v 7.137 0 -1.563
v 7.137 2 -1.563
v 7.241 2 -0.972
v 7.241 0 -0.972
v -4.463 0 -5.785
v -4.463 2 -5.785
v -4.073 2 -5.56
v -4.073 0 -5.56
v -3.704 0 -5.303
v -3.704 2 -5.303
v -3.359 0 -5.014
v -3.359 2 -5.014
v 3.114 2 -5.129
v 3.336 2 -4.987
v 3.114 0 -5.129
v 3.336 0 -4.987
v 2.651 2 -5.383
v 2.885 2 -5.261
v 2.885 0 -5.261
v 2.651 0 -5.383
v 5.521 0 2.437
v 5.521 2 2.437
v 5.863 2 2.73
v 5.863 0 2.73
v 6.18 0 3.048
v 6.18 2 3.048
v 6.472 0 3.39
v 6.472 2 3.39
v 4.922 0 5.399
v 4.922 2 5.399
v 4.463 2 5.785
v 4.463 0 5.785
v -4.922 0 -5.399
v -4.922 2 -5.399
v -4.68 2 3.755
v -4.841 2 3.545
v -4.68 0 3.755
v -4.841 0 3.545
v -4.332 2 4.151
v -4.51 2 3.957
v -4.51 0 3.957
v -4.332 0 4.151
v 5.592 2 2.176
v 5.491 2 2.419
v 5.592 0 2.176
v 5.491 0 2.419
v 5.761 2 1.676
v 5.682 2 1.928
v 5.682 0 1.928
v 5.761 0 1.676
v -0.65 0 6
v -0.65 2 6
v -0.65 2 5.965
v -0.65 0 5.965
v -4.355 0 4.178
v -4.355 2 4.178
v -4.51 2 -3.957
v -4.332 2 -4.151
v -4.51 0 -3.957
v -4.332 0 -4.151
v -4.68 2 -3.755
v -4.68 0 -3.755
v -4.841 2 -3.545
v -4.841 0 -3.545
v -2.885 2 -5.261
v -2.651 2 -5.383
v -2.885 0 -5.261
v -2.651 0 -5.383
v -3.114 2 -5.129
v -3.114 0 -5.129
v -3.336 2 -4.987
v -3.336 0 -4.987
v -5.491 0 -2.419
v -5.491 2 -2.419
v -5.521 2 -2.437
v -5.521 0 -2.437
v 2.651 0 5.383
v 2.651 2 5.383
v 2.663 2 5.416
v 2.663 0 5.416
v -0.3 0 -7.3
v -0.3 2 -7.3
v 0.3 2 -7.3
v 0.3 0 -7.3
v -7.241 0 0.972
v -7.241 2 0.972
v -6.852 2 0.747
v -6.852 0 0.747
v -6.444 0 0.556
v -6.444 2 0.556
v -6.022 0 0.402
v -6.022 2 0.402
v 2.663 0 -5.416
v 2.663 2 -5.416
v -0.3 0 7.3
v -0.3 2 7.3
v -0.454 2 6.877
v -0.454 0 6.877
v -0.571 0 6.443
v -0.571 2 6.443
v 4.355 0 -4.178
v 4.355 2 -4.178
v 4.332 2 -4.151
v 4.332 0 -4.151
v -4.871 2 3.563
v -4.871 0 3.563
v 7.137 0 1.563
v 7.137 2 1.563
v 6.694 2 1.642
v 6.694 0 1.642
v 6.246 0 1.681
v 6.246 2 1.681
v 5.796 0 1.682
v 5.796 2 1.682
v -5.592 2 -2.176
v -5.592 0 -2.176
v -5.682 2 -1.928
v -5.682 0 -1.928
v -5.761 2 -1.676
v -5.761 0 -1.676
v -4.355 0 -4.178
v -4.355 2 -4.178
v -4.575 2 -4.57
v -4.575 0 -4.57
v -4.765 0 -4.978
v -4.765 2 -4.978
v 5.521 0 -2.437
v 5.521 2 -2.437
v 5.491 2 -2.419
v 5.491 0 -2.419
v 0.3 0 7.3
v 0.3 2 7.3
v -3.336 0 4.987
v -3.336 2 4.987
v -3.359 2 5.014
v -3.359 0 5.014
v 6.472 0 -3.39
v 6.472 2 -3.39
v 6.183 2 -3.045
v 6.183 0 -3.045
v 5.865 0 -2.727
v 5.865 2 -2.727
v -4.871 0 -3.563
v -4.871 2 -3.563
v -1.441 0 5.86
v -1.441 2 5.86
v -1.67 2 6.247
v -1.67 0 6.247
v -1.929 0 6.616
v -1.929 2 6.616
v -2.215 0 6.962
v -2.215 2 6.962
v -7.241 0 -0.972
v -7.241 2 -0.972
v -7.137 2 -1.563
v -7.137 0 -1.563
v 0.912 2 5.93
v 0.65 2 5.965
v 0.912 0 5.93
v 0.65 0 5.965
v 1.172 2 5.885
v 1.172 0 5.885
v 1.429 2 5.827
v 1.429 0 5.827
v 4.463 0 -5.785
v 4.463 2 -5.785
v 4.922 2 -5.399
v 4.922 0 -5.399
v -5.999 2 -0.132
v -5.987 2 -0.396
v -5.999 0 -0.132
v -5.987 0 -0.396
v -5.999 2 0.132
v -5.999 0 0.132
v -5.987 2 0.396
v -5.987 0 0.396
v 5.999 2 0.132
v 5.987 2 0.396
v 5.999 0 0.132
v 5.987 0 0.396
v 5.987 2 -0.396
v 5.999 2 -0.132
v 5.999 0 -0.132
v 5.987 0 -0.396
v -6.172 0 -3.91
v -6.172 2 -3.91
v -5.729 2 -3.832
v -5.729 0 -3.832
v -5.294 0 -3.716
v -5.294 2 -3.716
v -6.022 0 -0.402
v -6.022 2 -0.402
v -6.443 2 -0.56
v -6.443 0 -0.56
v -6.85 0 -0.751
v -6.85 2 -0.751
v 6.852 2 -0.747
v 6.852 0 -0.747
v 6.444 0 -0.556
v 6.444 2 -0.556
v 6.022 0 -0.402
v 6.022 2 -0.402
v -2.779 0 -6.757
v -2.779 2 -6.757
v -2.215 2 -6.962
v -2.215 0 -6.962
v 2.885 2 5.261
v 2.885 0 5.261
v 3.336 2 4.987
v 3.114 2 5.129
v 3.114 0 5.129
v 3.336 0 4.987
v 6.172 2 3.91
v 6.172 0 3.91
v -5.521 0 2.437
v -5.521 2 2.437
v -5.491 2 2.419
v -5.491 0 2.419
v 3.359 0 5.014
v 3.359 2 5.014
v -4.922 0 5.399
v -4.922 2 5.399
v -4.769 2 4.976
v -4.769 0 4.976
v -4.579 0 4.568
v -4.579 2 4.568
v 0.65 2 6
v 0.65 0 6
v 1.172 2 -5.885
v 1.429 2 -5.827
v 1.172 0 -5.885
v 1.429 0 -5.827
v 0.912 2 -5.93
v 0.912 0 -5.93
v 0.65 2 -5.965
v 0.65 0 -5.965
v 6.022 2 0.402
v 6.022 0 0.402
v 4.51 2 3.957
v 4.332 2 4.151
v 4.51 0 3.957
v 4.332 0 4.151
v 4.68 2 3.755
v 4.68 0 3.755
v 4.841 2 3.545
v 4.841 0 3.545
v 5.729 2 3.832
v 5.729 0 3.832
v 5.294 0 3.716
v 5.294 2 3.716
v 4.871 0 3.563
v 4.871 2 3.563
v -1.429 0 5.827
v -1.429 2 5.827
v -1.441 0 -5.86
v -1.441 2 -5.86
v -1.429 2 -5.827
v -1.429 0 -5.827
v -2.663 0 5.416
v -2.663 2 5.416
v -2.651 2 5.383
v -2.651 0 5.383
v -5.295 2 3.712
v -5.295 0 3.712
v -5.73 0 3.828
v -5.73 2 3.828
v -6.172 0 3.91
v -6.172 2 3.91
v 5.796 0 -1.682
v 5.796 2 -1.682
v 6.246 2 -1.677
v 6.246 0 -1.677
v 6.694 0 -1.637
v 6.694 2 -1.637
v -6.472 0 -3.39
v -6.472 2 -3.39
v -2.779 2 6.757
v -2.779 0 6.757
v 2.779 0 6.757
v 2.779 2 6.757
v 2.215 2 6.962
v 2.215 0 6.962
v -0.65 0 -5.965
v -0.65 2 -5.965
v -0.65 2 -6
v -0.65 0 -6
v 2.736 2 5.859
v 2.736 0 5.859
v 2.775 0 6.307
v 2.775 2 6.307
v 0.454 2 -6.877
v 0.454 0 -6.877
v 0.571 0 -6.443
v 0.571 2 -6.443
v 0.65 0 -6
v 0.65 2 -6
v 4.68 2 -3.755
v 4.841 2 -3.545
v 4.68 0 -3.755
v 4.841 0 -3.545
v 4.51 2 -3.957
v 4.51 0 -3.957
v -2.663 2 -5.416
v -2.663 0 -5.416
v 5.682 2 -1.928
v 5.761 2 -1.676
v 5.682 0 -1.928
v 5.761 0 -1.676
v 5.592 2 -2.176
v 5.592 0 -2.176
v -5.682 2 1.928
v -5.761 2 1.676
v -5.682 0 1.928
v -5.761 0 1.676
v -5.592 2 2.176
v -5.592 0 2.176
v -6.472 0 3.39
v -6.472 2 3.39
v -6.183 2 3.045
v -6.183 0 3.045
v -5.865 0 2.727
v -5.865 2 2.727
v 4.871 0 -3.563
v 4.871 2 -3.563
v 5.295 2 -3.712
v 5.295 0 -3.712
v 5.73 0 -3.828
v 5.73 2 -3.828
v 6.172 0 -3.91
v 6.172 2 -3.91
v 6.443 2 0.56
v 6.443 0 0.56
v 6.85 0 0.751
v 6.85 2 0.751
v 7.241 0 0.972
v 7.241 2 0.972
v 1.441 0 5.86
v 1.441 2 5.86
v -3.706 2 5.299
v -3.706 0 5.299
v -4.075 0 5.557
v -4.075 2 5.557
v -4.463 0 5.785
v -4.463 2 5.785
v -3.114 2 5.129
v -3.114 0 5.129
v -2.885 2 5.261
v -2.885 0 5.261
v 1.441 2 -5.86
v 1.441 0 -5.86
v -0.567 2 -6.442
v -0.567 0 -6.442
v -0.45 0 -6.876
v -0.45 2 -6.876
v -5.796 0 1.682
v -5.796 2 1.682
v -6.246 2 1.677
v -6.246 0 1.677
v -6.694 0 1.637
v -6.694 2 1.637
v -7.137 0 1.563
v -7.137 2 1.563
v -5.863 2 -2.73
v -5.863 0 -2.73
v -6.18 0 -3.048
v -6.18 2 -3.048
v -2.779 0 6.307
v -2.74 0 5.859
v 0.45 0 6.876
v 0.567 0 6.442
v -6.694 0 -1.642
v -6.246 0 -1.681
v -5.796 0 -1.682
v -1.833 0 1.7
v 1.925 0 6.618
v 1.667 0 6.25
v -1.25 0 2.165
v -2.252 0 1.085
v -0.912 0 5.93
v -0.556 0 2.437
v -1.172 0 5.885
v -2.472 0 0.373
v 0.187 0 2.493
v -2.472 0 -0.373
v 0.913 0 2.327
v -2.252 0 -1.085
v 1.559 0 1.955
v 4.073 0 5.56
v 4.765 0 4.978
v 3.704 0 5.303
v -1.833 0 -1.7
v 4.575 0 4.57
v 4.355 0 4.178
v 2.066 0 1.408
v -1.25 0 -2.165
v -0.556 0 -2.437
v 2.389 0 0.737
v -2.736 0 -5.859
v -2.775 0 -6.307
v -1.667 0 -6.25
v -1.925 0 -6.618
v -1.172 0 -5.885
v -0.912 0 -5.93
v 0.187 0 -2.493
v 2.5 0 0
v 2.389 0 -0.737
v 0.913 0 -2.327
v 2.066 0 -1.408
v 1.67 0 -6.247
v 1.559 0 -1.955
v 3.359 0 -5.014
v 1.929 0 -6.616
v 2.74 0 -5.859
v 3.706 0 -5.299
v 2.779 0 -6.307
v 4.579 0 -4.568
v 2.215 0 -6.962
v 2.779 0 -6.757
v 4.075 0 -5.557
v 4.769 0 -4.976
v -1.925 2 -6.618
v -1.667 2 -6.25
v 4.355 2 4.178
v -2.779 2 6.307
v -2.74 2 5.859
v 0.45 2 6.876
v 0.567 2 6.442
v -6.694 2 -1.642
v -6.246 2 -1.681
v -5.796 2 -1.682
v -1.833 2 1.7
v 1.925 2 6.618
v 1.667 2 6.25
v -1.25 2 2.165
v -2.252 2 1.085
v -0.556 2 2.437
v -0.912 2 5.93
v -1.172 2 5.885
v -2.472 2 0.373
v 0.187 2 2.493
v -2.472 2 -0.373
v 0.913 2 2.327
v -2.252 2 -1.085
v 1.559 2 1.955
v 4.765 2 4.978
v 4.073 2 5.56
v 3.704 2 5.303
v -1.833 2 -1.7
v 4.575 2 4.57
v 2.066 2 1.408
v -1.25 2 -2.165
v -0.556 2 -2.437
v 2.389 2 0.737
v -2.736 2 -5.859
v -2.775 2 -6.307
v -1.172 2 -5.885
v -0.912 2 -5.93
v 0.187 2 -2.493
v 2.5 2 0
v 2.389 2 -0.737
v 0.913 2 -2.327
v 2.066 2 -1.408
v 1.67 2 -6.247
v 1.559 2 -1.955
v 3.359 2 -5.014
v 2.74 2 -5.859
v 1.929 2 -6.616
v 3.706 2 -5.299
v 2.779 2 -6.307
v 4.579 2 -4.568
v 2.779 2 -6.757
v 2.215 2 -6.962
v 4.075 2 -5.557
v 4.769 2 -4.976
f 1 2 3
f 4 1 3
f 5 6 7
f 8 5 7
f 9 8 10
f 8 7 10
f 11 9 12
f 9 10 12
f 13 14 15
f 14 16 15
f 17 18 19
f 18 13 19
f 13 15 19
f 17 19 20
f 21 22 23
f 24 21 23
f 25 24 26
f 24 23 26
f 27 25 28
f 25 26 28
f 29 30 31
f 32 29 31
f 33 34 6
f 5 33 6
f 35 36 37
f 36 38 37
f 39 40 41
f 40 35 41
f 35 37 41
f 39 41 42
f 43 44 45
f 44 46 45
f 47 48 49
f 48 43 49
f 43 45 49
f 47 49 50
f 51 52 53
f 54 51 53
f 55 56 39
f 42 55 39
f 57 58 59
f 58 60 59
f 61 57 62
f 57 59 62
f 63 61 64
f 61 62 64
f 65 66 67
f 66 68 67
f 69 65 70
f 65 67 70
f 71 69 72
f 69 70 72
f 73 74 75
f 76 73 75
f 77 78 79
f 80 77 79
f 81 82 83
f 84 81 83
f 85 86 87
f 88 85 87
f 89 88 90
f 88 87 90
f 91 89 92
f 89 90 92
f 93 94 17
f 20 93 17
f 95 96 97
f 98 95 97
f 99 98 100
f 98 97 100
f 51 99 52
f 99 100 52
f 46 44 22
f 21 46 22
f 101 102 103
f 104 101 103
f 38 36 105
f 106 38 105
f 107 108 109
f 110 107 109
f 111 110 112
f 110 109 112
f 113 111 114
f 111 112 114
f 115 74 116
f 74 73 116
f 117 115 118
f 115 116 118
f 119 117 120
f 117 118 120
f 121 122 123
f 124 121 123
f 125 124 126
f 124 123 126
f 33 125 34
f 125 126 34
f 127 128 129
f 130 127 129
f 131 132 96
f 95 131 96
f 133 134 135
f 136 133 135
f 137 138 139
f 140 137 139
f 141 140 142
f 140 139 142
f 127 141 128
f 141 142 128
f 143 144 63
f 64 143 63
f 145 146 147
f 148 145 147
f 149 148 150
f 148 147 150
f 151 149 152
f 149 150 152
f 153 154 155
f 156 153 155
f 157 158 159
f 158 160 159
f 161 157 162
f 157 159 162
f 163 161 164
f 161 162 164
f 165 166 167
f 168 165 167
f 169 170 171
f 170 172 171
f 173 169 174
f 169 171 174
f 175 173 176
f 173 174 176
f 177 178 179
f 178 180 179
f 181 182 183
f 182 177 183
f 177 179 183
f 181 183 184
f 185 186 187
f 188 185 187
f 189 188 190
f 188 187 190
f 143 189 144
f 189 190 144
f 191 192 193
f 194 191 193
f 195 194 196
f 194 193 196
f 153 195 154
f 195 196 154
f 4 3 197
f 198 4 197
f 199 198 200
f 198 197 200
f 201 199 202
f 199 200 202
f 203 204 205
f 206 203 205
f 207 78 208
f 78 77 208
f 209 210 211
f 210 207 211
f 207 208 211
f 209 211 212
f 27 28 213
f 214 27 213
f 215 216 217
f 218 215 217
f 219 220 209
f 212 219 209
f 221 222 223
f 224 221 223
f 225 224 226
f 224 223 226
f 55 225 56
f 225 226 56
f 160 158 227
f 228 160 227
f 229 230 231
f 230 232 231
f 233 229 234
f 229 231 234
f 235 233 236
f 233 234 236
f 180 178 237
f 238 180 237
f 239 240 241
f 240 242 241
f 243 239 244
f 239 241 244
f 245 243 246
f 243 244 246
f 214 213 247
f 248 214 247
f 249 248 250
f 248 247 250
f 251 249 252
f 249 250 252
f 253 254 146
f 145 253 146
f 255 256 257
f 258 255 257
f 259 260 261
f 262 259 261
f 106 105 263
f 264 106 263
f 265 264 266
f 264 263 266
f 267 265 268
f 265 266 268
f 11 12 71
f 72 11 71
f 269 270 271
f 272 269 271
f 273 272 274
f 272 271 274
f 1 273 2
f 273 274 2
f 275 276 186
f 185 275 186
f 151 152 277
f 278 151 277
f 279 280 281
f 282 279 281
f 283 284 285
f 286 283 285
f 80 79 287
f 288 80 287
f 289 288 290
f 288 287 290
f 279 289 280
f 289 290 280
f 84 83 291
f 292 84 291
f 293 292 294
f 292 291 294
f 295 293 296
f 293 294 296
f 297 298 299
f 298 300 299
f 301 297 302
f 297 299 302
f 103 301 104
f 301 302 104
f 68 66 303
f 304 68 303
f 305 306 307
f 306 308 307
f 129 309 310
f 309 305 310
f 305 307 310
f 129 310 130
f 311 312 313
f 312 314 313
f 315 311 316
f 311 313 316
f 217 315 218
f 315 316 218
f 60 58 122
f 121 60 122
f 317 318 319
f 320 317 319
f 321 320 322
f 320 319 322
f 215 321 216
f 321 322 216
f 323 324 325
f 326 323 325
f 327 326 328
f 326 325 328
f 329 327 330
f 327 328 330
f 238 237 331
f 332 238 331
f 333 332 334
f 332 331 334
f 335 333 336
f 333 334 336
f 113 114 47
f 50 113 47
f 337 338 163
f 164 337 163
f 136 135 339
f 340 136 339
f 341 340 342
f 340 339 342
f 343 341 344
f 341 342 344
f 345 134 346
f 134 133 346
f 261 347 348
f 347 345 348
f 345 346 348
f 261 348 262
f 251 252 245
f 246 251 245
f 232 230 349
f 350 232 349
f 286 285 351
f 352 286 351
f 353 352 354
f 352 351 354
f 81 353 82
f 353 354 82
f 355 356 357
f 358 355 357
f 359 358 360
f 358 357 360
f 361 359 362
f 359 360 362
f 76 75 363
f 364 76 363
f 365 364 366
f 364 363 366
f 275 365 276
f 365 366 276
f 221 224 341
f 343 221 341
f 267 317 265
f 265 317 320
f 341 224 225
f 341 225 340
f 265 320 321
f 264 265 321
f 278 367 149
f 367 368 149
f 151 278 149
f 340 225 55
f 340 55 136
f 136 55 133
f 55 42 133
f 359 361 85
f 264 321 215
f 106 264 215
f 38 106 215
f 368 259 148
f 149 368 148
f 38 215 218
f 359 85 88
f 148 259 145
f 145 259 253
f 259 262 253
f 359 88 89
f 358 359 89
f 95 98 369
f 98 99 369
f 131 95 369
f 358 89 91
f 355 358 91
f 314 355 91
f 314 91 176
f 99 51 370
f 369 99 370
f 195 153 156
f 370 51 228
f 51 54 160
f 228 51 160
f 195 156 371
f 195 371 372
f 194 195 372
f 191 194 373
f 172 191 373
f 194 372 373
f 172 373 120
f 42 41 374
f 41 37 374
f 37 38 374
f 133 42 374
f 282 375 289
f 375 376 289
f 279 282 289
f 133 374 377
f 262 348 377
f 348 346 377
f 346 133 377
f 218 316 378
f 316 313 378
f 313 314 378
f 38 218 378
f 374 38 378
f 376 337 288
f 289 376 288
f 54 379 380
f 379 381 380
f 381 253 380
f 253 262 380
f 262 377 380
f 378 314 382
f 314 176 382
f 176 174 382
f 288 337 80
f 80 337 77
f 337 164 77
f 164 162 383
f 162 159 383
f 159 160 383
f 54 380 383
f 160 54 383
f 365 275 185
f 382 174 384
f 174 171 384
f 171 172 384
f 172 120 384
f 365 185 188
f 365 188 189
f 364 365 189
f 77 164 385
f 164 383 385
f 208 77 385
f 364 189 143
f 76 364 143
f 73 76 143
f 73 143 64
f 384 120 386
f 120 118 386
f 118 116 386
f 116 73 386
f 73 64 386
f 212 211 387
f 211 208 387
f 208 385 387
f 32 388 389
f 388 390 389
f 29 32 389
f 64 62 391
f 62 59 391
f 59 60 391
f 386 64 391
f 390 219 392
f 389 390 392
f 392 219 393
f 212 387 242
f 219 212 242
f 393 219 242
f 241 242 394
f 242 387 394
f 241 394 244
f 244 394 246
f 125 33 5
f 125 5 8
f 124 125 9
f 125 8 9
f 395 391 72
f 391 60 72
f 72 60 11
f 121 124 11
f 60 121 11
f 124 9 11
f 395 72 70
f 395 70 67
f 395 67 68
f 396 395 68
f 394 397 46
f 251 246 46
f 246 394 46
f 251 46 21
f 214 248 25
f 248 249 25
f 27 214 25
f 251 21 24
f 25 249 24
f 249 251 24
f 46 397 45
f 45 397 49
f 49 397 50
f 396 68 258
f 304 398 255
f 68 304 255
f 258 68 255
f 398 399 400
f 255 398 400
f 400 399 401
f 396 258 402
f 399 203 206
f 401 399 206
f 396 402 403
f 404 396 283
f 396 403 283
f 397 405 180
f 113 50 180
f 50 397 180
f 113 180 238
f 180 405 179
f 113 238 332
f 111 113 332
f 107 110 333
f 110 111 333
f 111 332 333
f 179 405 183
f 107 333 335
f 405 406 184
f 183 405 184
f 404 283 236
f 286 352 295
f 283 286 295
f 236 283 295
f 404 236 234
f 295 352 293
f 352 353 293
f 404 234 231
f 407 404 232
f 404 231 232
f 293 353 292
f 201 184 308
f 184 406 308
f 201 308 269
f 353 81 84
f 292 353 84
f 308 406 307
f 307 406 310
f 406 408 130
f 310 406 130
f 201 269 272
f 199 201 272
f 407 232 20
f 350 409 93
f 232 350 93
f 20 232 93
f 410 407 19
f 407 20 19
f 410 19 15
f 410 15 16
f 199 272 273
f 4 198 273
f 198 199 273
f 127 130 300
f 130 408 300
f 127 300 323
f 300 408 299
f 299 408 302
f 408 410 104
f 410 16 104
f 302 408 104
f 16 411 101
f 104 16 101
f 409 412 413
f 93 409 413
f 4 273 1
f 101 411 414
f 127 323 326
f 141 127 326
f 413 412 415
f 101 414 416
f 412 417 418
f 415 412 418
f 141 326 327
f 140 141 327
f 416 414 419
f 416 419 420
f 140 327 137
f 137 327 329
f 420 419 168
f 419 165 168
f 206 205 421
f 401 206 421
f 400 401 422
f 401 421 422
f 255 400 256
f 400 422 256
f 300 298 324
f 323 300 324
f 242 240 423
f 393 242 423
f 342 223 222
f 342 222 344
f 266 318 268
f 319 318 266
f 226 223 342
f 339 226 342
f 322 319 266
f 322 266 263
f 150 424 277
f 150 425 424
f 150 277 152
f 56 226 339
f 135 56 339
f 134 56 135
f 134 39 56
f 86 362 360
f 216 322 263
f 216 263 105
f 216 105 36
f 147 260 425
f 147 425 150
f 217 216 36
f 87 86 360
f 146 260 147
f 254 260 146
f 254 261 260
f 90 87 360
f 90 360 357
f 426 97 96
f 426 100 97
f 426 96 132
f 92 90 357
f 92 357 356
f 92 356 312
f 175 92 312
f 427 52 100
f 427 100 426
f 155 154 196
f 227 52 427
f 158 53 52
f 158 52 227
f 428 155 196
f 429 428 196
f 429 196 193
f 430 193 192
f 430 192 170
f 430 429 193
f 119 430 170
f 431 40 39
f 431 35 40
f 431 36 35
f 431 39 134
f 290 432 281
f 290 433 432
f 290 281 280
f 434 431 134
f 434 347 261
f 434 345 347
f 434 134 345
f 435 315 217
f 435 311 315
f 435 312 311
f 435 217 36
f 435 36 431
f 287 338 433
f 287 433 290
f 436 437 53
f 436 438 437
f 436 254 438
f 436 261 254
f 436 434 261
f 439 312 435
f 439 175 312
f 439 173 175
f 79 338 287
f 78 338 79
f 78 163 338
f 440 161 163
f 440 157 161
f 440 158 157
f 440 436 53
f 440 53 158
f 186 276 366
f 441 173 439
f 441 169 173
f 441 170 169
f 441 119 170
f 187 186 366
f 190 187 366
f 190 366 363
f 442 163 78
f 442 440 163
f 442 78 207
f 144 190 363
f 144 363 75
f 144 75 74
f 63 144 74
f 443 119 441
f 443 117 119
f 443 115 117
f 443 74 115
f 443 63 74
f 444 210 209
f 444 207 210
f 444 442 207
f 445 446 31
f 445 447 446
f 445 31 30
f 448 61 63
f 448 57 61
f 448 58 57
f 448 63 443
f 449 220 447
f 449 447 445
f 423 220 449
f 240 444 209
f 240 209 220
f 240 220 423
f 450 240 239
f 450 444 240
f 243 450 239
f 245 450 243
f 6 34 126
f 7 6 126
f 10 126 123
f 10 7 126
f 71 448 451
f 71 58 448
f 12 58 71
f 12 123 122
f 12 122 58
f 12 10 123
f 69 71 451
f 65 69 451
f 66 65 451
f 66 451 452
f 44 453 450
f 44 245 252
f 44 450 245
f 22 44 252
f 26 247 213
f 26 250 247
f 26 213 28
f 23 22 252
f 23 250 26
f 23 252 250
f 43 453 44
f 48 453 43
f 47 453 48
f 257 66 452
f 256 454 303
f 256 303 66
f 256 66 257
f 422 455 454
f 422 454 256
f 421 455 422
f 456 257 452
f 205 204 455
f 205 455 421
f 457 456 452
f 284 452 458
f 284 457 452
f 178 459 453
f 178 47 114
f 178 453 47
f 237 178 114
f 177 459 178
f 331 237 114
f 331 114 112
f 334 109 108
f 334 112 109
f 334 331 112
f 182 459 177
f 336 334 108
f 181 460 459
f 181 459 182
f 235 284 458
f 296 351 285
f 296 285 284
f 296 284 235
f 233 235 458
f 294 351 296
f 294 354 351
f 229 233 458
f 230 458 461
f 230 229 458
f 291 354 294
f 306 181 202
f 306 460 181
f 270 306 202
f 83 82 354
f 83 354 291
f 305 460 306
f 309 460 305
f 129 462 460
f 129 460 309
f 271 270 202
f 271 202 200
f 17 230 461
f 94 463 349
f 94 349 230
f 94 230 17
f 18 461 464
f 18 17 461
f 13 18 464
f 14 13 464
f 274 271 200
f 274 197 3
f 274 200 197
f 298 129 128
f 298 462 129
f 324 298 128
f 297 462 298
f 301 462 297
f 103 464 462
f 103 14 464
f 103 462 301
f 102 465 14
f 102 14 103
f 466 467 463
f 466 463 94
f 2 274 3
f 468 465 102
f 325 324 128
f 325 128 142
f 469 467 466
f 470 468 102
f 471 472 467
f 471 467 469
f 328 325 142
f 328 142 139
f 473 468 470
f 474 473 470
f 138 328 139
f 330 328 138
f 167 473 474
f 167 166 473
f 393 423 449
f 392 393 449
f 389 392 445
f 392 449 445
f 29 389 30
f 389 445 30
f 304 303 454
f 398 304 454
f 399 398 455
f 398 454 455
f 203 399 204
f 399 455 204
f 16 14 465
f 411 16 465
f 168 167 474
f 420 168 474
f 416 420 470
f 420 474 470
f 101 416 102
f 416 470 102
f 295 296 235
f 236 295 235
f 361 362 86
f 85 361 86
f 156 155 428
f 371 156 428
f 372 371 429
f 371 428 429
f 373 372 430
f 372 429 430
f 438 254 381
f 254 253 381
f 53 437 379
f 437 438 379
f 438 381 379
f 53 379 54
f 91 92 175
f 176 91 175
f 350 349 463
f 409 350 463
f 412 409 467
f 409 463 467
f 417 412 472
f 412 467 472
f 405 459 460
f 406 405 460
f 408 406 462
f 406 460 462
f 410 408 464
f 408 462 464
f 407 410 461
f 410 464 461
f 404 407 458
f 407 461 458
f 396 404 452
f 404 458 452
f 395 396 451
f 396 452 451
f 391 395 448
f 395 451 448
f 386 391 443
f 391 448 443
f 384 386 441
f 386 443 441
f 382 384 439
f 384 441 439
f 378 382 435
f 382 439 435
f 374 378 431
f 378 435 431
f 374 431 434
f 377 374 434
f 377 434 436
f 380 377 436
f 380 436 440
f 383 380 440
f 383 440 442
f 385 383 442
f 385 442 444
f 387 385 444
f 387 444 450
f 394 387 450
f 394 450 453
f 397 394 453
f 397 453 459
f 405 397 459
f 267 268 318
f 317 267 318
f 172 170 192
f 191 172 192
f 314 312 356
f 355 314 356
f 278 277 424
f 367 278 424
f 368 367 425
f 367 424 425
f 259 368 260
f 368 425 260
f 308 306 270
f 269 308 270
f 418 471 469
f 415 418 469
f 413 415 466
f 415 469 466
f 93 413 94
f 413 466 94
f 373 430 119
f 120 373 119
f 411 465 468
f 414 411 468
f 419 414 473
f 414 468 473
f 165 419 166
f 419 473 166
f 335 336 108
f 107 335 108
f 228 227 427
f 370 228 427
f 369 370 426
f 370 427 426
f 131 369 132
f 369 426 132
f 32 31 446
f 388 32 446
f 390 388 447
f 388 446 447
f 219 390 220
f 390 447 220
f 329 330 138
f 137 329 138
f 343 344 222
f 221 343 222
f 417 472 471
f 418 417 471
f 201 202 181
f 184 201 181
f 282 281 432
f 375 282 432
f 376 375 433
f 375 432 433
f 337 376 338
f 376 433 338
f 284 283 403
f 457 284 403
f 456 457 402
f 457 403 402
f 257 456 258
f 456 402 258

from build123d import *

# Parameters (mm, degrees)
SKETCH1_R                = 6
BOSS_EXTRUDE1_DEPTH      = 2
SKETCH2_R                = 1.25
CUT_EXTRUDE1_DEPTH       = 3
CUT_EXTRUDE1_DEPTH_BACK  = 4
SKETCH3_R                = 2
SKETCH3_R_2              = 0.75
BOSS_EXTRUDE2_DEPTH      = 0.2
BOSS_EXTRUDE2_DEPTH_BACK = 2.2
BOSS_EXTRUDE3_DEPTH      = 2
CIRPATTERN1_COUNT        = 18
SKETCH5_R                = 2.5
CUT_EXTRUDE2_DEPTH       = 3
CUT_EXTRUDE2_DEPTH_BACK  = 5


with BuildPart() as part:
    # Sketch1 → Boss-Extrude1 (new body)
    with BuildSketch(Plane(origin=(0, 0, 0), x_dir=(1, 0, 0), z_dir=(0, 1, 0))):
        Circle(SKETCH1_R)
    extrude(amount=BOSS_EXTRUDE1_DEPTH)

    # Sketch2 → Cut-Extrude1 (cut, two sides)
    with BuildSketch(Plane(origin=(0, 2, 0), x_dir=(1, 0, 0), z_dir=(0, 1, 0))) as cut_extrude1_sk:
        Circle(SKETCH2_R)
    extrude(amount=CUT_EXTRUDE1_DEPTH, mode=Mode.SUBTRACT)
    extrude(cut_extrude1_sk.sketch, amount=-CUT_EXTRUDE1_DEPTH_BACK, mode=Mode.SUBTRACT)

    # Sketch3 → Boss-Extrude2 (add, two sides)
    with BuildSketch(Plane(origin=(0, 2, 0), x_dir=(1, 0, 0), z_dir=(0, 1, 0))) as boss_extrude2_sk:
        Circle(SKETCH3_R)
        Circle(SKETCH3_R_2, mode=Mode.SUBTRACT)
    extrude(amount=BOSS_EXTRUDE2_DEPTH)
    extrude(boss_extrude2_sk.sketch, amount=-BOSS_EXTRUDE2_DEPTH_BACK)

    # Sketch4 → Boss-Extrude3 (add)
    with BuildSketch(Plane(origin=(0, 2, 0), x_dir=(1, 0, 0), z_dir=(0, 1, 0))):
        with BuildLine():
            Line((-0.3, 7.3), (0.3, 7.3))
            ThreePointArc((0.3, 7.3), (0.517384179, 6.661411125), (0.65, 6))
            Line((0.65, 6), (0.65, 5.964687754))
            ThreePointArc((0.65, 5.964687754), (0, 6), (-0.65, 5.964687754))
            Line((-0.65, 5.964687754), (-0.65, 6))
            ThreePointArc((-0.65, 6), (-0.512944228, 6.660215754), (-0.3, 7.3))
        make_face()
    boss_extrude3 = extrude(amount=-BOSS_EXTRUDE3_DEPTH)

    # CirPattern1: Boss-Extrude3 ×18 about axis
    cirpattern1_axis = Axis((0, 0, 0), (0, 1, 0))
    for i in range(1, CIRPATTERN1_COUNT):
        add(boss_extrude3.rotate(cirpattern1_axis, i * 360 / CIRPATTERN1_COUNT))

    # Sketch5 → Cut-Extrude2 (cut, two sides)
    with BuildSketch(Plane(origin=(0, 2, 0), x_dir=(1, 0, 0), z_dir=(0, 1, 0))) as cut_extrude2_sk:
        Circle(SKETCH5_R)
    extrude(amount=CUT_EXTRUDE2_DEPTH, mode=Mode.SUBTRACT)
    extrude(cut_extrude2_sk.sketch, amount=-CUT_EXTRUDE2_DEPTH_BACK, mode=Mode.SUBTRACT)


solid = part.part
